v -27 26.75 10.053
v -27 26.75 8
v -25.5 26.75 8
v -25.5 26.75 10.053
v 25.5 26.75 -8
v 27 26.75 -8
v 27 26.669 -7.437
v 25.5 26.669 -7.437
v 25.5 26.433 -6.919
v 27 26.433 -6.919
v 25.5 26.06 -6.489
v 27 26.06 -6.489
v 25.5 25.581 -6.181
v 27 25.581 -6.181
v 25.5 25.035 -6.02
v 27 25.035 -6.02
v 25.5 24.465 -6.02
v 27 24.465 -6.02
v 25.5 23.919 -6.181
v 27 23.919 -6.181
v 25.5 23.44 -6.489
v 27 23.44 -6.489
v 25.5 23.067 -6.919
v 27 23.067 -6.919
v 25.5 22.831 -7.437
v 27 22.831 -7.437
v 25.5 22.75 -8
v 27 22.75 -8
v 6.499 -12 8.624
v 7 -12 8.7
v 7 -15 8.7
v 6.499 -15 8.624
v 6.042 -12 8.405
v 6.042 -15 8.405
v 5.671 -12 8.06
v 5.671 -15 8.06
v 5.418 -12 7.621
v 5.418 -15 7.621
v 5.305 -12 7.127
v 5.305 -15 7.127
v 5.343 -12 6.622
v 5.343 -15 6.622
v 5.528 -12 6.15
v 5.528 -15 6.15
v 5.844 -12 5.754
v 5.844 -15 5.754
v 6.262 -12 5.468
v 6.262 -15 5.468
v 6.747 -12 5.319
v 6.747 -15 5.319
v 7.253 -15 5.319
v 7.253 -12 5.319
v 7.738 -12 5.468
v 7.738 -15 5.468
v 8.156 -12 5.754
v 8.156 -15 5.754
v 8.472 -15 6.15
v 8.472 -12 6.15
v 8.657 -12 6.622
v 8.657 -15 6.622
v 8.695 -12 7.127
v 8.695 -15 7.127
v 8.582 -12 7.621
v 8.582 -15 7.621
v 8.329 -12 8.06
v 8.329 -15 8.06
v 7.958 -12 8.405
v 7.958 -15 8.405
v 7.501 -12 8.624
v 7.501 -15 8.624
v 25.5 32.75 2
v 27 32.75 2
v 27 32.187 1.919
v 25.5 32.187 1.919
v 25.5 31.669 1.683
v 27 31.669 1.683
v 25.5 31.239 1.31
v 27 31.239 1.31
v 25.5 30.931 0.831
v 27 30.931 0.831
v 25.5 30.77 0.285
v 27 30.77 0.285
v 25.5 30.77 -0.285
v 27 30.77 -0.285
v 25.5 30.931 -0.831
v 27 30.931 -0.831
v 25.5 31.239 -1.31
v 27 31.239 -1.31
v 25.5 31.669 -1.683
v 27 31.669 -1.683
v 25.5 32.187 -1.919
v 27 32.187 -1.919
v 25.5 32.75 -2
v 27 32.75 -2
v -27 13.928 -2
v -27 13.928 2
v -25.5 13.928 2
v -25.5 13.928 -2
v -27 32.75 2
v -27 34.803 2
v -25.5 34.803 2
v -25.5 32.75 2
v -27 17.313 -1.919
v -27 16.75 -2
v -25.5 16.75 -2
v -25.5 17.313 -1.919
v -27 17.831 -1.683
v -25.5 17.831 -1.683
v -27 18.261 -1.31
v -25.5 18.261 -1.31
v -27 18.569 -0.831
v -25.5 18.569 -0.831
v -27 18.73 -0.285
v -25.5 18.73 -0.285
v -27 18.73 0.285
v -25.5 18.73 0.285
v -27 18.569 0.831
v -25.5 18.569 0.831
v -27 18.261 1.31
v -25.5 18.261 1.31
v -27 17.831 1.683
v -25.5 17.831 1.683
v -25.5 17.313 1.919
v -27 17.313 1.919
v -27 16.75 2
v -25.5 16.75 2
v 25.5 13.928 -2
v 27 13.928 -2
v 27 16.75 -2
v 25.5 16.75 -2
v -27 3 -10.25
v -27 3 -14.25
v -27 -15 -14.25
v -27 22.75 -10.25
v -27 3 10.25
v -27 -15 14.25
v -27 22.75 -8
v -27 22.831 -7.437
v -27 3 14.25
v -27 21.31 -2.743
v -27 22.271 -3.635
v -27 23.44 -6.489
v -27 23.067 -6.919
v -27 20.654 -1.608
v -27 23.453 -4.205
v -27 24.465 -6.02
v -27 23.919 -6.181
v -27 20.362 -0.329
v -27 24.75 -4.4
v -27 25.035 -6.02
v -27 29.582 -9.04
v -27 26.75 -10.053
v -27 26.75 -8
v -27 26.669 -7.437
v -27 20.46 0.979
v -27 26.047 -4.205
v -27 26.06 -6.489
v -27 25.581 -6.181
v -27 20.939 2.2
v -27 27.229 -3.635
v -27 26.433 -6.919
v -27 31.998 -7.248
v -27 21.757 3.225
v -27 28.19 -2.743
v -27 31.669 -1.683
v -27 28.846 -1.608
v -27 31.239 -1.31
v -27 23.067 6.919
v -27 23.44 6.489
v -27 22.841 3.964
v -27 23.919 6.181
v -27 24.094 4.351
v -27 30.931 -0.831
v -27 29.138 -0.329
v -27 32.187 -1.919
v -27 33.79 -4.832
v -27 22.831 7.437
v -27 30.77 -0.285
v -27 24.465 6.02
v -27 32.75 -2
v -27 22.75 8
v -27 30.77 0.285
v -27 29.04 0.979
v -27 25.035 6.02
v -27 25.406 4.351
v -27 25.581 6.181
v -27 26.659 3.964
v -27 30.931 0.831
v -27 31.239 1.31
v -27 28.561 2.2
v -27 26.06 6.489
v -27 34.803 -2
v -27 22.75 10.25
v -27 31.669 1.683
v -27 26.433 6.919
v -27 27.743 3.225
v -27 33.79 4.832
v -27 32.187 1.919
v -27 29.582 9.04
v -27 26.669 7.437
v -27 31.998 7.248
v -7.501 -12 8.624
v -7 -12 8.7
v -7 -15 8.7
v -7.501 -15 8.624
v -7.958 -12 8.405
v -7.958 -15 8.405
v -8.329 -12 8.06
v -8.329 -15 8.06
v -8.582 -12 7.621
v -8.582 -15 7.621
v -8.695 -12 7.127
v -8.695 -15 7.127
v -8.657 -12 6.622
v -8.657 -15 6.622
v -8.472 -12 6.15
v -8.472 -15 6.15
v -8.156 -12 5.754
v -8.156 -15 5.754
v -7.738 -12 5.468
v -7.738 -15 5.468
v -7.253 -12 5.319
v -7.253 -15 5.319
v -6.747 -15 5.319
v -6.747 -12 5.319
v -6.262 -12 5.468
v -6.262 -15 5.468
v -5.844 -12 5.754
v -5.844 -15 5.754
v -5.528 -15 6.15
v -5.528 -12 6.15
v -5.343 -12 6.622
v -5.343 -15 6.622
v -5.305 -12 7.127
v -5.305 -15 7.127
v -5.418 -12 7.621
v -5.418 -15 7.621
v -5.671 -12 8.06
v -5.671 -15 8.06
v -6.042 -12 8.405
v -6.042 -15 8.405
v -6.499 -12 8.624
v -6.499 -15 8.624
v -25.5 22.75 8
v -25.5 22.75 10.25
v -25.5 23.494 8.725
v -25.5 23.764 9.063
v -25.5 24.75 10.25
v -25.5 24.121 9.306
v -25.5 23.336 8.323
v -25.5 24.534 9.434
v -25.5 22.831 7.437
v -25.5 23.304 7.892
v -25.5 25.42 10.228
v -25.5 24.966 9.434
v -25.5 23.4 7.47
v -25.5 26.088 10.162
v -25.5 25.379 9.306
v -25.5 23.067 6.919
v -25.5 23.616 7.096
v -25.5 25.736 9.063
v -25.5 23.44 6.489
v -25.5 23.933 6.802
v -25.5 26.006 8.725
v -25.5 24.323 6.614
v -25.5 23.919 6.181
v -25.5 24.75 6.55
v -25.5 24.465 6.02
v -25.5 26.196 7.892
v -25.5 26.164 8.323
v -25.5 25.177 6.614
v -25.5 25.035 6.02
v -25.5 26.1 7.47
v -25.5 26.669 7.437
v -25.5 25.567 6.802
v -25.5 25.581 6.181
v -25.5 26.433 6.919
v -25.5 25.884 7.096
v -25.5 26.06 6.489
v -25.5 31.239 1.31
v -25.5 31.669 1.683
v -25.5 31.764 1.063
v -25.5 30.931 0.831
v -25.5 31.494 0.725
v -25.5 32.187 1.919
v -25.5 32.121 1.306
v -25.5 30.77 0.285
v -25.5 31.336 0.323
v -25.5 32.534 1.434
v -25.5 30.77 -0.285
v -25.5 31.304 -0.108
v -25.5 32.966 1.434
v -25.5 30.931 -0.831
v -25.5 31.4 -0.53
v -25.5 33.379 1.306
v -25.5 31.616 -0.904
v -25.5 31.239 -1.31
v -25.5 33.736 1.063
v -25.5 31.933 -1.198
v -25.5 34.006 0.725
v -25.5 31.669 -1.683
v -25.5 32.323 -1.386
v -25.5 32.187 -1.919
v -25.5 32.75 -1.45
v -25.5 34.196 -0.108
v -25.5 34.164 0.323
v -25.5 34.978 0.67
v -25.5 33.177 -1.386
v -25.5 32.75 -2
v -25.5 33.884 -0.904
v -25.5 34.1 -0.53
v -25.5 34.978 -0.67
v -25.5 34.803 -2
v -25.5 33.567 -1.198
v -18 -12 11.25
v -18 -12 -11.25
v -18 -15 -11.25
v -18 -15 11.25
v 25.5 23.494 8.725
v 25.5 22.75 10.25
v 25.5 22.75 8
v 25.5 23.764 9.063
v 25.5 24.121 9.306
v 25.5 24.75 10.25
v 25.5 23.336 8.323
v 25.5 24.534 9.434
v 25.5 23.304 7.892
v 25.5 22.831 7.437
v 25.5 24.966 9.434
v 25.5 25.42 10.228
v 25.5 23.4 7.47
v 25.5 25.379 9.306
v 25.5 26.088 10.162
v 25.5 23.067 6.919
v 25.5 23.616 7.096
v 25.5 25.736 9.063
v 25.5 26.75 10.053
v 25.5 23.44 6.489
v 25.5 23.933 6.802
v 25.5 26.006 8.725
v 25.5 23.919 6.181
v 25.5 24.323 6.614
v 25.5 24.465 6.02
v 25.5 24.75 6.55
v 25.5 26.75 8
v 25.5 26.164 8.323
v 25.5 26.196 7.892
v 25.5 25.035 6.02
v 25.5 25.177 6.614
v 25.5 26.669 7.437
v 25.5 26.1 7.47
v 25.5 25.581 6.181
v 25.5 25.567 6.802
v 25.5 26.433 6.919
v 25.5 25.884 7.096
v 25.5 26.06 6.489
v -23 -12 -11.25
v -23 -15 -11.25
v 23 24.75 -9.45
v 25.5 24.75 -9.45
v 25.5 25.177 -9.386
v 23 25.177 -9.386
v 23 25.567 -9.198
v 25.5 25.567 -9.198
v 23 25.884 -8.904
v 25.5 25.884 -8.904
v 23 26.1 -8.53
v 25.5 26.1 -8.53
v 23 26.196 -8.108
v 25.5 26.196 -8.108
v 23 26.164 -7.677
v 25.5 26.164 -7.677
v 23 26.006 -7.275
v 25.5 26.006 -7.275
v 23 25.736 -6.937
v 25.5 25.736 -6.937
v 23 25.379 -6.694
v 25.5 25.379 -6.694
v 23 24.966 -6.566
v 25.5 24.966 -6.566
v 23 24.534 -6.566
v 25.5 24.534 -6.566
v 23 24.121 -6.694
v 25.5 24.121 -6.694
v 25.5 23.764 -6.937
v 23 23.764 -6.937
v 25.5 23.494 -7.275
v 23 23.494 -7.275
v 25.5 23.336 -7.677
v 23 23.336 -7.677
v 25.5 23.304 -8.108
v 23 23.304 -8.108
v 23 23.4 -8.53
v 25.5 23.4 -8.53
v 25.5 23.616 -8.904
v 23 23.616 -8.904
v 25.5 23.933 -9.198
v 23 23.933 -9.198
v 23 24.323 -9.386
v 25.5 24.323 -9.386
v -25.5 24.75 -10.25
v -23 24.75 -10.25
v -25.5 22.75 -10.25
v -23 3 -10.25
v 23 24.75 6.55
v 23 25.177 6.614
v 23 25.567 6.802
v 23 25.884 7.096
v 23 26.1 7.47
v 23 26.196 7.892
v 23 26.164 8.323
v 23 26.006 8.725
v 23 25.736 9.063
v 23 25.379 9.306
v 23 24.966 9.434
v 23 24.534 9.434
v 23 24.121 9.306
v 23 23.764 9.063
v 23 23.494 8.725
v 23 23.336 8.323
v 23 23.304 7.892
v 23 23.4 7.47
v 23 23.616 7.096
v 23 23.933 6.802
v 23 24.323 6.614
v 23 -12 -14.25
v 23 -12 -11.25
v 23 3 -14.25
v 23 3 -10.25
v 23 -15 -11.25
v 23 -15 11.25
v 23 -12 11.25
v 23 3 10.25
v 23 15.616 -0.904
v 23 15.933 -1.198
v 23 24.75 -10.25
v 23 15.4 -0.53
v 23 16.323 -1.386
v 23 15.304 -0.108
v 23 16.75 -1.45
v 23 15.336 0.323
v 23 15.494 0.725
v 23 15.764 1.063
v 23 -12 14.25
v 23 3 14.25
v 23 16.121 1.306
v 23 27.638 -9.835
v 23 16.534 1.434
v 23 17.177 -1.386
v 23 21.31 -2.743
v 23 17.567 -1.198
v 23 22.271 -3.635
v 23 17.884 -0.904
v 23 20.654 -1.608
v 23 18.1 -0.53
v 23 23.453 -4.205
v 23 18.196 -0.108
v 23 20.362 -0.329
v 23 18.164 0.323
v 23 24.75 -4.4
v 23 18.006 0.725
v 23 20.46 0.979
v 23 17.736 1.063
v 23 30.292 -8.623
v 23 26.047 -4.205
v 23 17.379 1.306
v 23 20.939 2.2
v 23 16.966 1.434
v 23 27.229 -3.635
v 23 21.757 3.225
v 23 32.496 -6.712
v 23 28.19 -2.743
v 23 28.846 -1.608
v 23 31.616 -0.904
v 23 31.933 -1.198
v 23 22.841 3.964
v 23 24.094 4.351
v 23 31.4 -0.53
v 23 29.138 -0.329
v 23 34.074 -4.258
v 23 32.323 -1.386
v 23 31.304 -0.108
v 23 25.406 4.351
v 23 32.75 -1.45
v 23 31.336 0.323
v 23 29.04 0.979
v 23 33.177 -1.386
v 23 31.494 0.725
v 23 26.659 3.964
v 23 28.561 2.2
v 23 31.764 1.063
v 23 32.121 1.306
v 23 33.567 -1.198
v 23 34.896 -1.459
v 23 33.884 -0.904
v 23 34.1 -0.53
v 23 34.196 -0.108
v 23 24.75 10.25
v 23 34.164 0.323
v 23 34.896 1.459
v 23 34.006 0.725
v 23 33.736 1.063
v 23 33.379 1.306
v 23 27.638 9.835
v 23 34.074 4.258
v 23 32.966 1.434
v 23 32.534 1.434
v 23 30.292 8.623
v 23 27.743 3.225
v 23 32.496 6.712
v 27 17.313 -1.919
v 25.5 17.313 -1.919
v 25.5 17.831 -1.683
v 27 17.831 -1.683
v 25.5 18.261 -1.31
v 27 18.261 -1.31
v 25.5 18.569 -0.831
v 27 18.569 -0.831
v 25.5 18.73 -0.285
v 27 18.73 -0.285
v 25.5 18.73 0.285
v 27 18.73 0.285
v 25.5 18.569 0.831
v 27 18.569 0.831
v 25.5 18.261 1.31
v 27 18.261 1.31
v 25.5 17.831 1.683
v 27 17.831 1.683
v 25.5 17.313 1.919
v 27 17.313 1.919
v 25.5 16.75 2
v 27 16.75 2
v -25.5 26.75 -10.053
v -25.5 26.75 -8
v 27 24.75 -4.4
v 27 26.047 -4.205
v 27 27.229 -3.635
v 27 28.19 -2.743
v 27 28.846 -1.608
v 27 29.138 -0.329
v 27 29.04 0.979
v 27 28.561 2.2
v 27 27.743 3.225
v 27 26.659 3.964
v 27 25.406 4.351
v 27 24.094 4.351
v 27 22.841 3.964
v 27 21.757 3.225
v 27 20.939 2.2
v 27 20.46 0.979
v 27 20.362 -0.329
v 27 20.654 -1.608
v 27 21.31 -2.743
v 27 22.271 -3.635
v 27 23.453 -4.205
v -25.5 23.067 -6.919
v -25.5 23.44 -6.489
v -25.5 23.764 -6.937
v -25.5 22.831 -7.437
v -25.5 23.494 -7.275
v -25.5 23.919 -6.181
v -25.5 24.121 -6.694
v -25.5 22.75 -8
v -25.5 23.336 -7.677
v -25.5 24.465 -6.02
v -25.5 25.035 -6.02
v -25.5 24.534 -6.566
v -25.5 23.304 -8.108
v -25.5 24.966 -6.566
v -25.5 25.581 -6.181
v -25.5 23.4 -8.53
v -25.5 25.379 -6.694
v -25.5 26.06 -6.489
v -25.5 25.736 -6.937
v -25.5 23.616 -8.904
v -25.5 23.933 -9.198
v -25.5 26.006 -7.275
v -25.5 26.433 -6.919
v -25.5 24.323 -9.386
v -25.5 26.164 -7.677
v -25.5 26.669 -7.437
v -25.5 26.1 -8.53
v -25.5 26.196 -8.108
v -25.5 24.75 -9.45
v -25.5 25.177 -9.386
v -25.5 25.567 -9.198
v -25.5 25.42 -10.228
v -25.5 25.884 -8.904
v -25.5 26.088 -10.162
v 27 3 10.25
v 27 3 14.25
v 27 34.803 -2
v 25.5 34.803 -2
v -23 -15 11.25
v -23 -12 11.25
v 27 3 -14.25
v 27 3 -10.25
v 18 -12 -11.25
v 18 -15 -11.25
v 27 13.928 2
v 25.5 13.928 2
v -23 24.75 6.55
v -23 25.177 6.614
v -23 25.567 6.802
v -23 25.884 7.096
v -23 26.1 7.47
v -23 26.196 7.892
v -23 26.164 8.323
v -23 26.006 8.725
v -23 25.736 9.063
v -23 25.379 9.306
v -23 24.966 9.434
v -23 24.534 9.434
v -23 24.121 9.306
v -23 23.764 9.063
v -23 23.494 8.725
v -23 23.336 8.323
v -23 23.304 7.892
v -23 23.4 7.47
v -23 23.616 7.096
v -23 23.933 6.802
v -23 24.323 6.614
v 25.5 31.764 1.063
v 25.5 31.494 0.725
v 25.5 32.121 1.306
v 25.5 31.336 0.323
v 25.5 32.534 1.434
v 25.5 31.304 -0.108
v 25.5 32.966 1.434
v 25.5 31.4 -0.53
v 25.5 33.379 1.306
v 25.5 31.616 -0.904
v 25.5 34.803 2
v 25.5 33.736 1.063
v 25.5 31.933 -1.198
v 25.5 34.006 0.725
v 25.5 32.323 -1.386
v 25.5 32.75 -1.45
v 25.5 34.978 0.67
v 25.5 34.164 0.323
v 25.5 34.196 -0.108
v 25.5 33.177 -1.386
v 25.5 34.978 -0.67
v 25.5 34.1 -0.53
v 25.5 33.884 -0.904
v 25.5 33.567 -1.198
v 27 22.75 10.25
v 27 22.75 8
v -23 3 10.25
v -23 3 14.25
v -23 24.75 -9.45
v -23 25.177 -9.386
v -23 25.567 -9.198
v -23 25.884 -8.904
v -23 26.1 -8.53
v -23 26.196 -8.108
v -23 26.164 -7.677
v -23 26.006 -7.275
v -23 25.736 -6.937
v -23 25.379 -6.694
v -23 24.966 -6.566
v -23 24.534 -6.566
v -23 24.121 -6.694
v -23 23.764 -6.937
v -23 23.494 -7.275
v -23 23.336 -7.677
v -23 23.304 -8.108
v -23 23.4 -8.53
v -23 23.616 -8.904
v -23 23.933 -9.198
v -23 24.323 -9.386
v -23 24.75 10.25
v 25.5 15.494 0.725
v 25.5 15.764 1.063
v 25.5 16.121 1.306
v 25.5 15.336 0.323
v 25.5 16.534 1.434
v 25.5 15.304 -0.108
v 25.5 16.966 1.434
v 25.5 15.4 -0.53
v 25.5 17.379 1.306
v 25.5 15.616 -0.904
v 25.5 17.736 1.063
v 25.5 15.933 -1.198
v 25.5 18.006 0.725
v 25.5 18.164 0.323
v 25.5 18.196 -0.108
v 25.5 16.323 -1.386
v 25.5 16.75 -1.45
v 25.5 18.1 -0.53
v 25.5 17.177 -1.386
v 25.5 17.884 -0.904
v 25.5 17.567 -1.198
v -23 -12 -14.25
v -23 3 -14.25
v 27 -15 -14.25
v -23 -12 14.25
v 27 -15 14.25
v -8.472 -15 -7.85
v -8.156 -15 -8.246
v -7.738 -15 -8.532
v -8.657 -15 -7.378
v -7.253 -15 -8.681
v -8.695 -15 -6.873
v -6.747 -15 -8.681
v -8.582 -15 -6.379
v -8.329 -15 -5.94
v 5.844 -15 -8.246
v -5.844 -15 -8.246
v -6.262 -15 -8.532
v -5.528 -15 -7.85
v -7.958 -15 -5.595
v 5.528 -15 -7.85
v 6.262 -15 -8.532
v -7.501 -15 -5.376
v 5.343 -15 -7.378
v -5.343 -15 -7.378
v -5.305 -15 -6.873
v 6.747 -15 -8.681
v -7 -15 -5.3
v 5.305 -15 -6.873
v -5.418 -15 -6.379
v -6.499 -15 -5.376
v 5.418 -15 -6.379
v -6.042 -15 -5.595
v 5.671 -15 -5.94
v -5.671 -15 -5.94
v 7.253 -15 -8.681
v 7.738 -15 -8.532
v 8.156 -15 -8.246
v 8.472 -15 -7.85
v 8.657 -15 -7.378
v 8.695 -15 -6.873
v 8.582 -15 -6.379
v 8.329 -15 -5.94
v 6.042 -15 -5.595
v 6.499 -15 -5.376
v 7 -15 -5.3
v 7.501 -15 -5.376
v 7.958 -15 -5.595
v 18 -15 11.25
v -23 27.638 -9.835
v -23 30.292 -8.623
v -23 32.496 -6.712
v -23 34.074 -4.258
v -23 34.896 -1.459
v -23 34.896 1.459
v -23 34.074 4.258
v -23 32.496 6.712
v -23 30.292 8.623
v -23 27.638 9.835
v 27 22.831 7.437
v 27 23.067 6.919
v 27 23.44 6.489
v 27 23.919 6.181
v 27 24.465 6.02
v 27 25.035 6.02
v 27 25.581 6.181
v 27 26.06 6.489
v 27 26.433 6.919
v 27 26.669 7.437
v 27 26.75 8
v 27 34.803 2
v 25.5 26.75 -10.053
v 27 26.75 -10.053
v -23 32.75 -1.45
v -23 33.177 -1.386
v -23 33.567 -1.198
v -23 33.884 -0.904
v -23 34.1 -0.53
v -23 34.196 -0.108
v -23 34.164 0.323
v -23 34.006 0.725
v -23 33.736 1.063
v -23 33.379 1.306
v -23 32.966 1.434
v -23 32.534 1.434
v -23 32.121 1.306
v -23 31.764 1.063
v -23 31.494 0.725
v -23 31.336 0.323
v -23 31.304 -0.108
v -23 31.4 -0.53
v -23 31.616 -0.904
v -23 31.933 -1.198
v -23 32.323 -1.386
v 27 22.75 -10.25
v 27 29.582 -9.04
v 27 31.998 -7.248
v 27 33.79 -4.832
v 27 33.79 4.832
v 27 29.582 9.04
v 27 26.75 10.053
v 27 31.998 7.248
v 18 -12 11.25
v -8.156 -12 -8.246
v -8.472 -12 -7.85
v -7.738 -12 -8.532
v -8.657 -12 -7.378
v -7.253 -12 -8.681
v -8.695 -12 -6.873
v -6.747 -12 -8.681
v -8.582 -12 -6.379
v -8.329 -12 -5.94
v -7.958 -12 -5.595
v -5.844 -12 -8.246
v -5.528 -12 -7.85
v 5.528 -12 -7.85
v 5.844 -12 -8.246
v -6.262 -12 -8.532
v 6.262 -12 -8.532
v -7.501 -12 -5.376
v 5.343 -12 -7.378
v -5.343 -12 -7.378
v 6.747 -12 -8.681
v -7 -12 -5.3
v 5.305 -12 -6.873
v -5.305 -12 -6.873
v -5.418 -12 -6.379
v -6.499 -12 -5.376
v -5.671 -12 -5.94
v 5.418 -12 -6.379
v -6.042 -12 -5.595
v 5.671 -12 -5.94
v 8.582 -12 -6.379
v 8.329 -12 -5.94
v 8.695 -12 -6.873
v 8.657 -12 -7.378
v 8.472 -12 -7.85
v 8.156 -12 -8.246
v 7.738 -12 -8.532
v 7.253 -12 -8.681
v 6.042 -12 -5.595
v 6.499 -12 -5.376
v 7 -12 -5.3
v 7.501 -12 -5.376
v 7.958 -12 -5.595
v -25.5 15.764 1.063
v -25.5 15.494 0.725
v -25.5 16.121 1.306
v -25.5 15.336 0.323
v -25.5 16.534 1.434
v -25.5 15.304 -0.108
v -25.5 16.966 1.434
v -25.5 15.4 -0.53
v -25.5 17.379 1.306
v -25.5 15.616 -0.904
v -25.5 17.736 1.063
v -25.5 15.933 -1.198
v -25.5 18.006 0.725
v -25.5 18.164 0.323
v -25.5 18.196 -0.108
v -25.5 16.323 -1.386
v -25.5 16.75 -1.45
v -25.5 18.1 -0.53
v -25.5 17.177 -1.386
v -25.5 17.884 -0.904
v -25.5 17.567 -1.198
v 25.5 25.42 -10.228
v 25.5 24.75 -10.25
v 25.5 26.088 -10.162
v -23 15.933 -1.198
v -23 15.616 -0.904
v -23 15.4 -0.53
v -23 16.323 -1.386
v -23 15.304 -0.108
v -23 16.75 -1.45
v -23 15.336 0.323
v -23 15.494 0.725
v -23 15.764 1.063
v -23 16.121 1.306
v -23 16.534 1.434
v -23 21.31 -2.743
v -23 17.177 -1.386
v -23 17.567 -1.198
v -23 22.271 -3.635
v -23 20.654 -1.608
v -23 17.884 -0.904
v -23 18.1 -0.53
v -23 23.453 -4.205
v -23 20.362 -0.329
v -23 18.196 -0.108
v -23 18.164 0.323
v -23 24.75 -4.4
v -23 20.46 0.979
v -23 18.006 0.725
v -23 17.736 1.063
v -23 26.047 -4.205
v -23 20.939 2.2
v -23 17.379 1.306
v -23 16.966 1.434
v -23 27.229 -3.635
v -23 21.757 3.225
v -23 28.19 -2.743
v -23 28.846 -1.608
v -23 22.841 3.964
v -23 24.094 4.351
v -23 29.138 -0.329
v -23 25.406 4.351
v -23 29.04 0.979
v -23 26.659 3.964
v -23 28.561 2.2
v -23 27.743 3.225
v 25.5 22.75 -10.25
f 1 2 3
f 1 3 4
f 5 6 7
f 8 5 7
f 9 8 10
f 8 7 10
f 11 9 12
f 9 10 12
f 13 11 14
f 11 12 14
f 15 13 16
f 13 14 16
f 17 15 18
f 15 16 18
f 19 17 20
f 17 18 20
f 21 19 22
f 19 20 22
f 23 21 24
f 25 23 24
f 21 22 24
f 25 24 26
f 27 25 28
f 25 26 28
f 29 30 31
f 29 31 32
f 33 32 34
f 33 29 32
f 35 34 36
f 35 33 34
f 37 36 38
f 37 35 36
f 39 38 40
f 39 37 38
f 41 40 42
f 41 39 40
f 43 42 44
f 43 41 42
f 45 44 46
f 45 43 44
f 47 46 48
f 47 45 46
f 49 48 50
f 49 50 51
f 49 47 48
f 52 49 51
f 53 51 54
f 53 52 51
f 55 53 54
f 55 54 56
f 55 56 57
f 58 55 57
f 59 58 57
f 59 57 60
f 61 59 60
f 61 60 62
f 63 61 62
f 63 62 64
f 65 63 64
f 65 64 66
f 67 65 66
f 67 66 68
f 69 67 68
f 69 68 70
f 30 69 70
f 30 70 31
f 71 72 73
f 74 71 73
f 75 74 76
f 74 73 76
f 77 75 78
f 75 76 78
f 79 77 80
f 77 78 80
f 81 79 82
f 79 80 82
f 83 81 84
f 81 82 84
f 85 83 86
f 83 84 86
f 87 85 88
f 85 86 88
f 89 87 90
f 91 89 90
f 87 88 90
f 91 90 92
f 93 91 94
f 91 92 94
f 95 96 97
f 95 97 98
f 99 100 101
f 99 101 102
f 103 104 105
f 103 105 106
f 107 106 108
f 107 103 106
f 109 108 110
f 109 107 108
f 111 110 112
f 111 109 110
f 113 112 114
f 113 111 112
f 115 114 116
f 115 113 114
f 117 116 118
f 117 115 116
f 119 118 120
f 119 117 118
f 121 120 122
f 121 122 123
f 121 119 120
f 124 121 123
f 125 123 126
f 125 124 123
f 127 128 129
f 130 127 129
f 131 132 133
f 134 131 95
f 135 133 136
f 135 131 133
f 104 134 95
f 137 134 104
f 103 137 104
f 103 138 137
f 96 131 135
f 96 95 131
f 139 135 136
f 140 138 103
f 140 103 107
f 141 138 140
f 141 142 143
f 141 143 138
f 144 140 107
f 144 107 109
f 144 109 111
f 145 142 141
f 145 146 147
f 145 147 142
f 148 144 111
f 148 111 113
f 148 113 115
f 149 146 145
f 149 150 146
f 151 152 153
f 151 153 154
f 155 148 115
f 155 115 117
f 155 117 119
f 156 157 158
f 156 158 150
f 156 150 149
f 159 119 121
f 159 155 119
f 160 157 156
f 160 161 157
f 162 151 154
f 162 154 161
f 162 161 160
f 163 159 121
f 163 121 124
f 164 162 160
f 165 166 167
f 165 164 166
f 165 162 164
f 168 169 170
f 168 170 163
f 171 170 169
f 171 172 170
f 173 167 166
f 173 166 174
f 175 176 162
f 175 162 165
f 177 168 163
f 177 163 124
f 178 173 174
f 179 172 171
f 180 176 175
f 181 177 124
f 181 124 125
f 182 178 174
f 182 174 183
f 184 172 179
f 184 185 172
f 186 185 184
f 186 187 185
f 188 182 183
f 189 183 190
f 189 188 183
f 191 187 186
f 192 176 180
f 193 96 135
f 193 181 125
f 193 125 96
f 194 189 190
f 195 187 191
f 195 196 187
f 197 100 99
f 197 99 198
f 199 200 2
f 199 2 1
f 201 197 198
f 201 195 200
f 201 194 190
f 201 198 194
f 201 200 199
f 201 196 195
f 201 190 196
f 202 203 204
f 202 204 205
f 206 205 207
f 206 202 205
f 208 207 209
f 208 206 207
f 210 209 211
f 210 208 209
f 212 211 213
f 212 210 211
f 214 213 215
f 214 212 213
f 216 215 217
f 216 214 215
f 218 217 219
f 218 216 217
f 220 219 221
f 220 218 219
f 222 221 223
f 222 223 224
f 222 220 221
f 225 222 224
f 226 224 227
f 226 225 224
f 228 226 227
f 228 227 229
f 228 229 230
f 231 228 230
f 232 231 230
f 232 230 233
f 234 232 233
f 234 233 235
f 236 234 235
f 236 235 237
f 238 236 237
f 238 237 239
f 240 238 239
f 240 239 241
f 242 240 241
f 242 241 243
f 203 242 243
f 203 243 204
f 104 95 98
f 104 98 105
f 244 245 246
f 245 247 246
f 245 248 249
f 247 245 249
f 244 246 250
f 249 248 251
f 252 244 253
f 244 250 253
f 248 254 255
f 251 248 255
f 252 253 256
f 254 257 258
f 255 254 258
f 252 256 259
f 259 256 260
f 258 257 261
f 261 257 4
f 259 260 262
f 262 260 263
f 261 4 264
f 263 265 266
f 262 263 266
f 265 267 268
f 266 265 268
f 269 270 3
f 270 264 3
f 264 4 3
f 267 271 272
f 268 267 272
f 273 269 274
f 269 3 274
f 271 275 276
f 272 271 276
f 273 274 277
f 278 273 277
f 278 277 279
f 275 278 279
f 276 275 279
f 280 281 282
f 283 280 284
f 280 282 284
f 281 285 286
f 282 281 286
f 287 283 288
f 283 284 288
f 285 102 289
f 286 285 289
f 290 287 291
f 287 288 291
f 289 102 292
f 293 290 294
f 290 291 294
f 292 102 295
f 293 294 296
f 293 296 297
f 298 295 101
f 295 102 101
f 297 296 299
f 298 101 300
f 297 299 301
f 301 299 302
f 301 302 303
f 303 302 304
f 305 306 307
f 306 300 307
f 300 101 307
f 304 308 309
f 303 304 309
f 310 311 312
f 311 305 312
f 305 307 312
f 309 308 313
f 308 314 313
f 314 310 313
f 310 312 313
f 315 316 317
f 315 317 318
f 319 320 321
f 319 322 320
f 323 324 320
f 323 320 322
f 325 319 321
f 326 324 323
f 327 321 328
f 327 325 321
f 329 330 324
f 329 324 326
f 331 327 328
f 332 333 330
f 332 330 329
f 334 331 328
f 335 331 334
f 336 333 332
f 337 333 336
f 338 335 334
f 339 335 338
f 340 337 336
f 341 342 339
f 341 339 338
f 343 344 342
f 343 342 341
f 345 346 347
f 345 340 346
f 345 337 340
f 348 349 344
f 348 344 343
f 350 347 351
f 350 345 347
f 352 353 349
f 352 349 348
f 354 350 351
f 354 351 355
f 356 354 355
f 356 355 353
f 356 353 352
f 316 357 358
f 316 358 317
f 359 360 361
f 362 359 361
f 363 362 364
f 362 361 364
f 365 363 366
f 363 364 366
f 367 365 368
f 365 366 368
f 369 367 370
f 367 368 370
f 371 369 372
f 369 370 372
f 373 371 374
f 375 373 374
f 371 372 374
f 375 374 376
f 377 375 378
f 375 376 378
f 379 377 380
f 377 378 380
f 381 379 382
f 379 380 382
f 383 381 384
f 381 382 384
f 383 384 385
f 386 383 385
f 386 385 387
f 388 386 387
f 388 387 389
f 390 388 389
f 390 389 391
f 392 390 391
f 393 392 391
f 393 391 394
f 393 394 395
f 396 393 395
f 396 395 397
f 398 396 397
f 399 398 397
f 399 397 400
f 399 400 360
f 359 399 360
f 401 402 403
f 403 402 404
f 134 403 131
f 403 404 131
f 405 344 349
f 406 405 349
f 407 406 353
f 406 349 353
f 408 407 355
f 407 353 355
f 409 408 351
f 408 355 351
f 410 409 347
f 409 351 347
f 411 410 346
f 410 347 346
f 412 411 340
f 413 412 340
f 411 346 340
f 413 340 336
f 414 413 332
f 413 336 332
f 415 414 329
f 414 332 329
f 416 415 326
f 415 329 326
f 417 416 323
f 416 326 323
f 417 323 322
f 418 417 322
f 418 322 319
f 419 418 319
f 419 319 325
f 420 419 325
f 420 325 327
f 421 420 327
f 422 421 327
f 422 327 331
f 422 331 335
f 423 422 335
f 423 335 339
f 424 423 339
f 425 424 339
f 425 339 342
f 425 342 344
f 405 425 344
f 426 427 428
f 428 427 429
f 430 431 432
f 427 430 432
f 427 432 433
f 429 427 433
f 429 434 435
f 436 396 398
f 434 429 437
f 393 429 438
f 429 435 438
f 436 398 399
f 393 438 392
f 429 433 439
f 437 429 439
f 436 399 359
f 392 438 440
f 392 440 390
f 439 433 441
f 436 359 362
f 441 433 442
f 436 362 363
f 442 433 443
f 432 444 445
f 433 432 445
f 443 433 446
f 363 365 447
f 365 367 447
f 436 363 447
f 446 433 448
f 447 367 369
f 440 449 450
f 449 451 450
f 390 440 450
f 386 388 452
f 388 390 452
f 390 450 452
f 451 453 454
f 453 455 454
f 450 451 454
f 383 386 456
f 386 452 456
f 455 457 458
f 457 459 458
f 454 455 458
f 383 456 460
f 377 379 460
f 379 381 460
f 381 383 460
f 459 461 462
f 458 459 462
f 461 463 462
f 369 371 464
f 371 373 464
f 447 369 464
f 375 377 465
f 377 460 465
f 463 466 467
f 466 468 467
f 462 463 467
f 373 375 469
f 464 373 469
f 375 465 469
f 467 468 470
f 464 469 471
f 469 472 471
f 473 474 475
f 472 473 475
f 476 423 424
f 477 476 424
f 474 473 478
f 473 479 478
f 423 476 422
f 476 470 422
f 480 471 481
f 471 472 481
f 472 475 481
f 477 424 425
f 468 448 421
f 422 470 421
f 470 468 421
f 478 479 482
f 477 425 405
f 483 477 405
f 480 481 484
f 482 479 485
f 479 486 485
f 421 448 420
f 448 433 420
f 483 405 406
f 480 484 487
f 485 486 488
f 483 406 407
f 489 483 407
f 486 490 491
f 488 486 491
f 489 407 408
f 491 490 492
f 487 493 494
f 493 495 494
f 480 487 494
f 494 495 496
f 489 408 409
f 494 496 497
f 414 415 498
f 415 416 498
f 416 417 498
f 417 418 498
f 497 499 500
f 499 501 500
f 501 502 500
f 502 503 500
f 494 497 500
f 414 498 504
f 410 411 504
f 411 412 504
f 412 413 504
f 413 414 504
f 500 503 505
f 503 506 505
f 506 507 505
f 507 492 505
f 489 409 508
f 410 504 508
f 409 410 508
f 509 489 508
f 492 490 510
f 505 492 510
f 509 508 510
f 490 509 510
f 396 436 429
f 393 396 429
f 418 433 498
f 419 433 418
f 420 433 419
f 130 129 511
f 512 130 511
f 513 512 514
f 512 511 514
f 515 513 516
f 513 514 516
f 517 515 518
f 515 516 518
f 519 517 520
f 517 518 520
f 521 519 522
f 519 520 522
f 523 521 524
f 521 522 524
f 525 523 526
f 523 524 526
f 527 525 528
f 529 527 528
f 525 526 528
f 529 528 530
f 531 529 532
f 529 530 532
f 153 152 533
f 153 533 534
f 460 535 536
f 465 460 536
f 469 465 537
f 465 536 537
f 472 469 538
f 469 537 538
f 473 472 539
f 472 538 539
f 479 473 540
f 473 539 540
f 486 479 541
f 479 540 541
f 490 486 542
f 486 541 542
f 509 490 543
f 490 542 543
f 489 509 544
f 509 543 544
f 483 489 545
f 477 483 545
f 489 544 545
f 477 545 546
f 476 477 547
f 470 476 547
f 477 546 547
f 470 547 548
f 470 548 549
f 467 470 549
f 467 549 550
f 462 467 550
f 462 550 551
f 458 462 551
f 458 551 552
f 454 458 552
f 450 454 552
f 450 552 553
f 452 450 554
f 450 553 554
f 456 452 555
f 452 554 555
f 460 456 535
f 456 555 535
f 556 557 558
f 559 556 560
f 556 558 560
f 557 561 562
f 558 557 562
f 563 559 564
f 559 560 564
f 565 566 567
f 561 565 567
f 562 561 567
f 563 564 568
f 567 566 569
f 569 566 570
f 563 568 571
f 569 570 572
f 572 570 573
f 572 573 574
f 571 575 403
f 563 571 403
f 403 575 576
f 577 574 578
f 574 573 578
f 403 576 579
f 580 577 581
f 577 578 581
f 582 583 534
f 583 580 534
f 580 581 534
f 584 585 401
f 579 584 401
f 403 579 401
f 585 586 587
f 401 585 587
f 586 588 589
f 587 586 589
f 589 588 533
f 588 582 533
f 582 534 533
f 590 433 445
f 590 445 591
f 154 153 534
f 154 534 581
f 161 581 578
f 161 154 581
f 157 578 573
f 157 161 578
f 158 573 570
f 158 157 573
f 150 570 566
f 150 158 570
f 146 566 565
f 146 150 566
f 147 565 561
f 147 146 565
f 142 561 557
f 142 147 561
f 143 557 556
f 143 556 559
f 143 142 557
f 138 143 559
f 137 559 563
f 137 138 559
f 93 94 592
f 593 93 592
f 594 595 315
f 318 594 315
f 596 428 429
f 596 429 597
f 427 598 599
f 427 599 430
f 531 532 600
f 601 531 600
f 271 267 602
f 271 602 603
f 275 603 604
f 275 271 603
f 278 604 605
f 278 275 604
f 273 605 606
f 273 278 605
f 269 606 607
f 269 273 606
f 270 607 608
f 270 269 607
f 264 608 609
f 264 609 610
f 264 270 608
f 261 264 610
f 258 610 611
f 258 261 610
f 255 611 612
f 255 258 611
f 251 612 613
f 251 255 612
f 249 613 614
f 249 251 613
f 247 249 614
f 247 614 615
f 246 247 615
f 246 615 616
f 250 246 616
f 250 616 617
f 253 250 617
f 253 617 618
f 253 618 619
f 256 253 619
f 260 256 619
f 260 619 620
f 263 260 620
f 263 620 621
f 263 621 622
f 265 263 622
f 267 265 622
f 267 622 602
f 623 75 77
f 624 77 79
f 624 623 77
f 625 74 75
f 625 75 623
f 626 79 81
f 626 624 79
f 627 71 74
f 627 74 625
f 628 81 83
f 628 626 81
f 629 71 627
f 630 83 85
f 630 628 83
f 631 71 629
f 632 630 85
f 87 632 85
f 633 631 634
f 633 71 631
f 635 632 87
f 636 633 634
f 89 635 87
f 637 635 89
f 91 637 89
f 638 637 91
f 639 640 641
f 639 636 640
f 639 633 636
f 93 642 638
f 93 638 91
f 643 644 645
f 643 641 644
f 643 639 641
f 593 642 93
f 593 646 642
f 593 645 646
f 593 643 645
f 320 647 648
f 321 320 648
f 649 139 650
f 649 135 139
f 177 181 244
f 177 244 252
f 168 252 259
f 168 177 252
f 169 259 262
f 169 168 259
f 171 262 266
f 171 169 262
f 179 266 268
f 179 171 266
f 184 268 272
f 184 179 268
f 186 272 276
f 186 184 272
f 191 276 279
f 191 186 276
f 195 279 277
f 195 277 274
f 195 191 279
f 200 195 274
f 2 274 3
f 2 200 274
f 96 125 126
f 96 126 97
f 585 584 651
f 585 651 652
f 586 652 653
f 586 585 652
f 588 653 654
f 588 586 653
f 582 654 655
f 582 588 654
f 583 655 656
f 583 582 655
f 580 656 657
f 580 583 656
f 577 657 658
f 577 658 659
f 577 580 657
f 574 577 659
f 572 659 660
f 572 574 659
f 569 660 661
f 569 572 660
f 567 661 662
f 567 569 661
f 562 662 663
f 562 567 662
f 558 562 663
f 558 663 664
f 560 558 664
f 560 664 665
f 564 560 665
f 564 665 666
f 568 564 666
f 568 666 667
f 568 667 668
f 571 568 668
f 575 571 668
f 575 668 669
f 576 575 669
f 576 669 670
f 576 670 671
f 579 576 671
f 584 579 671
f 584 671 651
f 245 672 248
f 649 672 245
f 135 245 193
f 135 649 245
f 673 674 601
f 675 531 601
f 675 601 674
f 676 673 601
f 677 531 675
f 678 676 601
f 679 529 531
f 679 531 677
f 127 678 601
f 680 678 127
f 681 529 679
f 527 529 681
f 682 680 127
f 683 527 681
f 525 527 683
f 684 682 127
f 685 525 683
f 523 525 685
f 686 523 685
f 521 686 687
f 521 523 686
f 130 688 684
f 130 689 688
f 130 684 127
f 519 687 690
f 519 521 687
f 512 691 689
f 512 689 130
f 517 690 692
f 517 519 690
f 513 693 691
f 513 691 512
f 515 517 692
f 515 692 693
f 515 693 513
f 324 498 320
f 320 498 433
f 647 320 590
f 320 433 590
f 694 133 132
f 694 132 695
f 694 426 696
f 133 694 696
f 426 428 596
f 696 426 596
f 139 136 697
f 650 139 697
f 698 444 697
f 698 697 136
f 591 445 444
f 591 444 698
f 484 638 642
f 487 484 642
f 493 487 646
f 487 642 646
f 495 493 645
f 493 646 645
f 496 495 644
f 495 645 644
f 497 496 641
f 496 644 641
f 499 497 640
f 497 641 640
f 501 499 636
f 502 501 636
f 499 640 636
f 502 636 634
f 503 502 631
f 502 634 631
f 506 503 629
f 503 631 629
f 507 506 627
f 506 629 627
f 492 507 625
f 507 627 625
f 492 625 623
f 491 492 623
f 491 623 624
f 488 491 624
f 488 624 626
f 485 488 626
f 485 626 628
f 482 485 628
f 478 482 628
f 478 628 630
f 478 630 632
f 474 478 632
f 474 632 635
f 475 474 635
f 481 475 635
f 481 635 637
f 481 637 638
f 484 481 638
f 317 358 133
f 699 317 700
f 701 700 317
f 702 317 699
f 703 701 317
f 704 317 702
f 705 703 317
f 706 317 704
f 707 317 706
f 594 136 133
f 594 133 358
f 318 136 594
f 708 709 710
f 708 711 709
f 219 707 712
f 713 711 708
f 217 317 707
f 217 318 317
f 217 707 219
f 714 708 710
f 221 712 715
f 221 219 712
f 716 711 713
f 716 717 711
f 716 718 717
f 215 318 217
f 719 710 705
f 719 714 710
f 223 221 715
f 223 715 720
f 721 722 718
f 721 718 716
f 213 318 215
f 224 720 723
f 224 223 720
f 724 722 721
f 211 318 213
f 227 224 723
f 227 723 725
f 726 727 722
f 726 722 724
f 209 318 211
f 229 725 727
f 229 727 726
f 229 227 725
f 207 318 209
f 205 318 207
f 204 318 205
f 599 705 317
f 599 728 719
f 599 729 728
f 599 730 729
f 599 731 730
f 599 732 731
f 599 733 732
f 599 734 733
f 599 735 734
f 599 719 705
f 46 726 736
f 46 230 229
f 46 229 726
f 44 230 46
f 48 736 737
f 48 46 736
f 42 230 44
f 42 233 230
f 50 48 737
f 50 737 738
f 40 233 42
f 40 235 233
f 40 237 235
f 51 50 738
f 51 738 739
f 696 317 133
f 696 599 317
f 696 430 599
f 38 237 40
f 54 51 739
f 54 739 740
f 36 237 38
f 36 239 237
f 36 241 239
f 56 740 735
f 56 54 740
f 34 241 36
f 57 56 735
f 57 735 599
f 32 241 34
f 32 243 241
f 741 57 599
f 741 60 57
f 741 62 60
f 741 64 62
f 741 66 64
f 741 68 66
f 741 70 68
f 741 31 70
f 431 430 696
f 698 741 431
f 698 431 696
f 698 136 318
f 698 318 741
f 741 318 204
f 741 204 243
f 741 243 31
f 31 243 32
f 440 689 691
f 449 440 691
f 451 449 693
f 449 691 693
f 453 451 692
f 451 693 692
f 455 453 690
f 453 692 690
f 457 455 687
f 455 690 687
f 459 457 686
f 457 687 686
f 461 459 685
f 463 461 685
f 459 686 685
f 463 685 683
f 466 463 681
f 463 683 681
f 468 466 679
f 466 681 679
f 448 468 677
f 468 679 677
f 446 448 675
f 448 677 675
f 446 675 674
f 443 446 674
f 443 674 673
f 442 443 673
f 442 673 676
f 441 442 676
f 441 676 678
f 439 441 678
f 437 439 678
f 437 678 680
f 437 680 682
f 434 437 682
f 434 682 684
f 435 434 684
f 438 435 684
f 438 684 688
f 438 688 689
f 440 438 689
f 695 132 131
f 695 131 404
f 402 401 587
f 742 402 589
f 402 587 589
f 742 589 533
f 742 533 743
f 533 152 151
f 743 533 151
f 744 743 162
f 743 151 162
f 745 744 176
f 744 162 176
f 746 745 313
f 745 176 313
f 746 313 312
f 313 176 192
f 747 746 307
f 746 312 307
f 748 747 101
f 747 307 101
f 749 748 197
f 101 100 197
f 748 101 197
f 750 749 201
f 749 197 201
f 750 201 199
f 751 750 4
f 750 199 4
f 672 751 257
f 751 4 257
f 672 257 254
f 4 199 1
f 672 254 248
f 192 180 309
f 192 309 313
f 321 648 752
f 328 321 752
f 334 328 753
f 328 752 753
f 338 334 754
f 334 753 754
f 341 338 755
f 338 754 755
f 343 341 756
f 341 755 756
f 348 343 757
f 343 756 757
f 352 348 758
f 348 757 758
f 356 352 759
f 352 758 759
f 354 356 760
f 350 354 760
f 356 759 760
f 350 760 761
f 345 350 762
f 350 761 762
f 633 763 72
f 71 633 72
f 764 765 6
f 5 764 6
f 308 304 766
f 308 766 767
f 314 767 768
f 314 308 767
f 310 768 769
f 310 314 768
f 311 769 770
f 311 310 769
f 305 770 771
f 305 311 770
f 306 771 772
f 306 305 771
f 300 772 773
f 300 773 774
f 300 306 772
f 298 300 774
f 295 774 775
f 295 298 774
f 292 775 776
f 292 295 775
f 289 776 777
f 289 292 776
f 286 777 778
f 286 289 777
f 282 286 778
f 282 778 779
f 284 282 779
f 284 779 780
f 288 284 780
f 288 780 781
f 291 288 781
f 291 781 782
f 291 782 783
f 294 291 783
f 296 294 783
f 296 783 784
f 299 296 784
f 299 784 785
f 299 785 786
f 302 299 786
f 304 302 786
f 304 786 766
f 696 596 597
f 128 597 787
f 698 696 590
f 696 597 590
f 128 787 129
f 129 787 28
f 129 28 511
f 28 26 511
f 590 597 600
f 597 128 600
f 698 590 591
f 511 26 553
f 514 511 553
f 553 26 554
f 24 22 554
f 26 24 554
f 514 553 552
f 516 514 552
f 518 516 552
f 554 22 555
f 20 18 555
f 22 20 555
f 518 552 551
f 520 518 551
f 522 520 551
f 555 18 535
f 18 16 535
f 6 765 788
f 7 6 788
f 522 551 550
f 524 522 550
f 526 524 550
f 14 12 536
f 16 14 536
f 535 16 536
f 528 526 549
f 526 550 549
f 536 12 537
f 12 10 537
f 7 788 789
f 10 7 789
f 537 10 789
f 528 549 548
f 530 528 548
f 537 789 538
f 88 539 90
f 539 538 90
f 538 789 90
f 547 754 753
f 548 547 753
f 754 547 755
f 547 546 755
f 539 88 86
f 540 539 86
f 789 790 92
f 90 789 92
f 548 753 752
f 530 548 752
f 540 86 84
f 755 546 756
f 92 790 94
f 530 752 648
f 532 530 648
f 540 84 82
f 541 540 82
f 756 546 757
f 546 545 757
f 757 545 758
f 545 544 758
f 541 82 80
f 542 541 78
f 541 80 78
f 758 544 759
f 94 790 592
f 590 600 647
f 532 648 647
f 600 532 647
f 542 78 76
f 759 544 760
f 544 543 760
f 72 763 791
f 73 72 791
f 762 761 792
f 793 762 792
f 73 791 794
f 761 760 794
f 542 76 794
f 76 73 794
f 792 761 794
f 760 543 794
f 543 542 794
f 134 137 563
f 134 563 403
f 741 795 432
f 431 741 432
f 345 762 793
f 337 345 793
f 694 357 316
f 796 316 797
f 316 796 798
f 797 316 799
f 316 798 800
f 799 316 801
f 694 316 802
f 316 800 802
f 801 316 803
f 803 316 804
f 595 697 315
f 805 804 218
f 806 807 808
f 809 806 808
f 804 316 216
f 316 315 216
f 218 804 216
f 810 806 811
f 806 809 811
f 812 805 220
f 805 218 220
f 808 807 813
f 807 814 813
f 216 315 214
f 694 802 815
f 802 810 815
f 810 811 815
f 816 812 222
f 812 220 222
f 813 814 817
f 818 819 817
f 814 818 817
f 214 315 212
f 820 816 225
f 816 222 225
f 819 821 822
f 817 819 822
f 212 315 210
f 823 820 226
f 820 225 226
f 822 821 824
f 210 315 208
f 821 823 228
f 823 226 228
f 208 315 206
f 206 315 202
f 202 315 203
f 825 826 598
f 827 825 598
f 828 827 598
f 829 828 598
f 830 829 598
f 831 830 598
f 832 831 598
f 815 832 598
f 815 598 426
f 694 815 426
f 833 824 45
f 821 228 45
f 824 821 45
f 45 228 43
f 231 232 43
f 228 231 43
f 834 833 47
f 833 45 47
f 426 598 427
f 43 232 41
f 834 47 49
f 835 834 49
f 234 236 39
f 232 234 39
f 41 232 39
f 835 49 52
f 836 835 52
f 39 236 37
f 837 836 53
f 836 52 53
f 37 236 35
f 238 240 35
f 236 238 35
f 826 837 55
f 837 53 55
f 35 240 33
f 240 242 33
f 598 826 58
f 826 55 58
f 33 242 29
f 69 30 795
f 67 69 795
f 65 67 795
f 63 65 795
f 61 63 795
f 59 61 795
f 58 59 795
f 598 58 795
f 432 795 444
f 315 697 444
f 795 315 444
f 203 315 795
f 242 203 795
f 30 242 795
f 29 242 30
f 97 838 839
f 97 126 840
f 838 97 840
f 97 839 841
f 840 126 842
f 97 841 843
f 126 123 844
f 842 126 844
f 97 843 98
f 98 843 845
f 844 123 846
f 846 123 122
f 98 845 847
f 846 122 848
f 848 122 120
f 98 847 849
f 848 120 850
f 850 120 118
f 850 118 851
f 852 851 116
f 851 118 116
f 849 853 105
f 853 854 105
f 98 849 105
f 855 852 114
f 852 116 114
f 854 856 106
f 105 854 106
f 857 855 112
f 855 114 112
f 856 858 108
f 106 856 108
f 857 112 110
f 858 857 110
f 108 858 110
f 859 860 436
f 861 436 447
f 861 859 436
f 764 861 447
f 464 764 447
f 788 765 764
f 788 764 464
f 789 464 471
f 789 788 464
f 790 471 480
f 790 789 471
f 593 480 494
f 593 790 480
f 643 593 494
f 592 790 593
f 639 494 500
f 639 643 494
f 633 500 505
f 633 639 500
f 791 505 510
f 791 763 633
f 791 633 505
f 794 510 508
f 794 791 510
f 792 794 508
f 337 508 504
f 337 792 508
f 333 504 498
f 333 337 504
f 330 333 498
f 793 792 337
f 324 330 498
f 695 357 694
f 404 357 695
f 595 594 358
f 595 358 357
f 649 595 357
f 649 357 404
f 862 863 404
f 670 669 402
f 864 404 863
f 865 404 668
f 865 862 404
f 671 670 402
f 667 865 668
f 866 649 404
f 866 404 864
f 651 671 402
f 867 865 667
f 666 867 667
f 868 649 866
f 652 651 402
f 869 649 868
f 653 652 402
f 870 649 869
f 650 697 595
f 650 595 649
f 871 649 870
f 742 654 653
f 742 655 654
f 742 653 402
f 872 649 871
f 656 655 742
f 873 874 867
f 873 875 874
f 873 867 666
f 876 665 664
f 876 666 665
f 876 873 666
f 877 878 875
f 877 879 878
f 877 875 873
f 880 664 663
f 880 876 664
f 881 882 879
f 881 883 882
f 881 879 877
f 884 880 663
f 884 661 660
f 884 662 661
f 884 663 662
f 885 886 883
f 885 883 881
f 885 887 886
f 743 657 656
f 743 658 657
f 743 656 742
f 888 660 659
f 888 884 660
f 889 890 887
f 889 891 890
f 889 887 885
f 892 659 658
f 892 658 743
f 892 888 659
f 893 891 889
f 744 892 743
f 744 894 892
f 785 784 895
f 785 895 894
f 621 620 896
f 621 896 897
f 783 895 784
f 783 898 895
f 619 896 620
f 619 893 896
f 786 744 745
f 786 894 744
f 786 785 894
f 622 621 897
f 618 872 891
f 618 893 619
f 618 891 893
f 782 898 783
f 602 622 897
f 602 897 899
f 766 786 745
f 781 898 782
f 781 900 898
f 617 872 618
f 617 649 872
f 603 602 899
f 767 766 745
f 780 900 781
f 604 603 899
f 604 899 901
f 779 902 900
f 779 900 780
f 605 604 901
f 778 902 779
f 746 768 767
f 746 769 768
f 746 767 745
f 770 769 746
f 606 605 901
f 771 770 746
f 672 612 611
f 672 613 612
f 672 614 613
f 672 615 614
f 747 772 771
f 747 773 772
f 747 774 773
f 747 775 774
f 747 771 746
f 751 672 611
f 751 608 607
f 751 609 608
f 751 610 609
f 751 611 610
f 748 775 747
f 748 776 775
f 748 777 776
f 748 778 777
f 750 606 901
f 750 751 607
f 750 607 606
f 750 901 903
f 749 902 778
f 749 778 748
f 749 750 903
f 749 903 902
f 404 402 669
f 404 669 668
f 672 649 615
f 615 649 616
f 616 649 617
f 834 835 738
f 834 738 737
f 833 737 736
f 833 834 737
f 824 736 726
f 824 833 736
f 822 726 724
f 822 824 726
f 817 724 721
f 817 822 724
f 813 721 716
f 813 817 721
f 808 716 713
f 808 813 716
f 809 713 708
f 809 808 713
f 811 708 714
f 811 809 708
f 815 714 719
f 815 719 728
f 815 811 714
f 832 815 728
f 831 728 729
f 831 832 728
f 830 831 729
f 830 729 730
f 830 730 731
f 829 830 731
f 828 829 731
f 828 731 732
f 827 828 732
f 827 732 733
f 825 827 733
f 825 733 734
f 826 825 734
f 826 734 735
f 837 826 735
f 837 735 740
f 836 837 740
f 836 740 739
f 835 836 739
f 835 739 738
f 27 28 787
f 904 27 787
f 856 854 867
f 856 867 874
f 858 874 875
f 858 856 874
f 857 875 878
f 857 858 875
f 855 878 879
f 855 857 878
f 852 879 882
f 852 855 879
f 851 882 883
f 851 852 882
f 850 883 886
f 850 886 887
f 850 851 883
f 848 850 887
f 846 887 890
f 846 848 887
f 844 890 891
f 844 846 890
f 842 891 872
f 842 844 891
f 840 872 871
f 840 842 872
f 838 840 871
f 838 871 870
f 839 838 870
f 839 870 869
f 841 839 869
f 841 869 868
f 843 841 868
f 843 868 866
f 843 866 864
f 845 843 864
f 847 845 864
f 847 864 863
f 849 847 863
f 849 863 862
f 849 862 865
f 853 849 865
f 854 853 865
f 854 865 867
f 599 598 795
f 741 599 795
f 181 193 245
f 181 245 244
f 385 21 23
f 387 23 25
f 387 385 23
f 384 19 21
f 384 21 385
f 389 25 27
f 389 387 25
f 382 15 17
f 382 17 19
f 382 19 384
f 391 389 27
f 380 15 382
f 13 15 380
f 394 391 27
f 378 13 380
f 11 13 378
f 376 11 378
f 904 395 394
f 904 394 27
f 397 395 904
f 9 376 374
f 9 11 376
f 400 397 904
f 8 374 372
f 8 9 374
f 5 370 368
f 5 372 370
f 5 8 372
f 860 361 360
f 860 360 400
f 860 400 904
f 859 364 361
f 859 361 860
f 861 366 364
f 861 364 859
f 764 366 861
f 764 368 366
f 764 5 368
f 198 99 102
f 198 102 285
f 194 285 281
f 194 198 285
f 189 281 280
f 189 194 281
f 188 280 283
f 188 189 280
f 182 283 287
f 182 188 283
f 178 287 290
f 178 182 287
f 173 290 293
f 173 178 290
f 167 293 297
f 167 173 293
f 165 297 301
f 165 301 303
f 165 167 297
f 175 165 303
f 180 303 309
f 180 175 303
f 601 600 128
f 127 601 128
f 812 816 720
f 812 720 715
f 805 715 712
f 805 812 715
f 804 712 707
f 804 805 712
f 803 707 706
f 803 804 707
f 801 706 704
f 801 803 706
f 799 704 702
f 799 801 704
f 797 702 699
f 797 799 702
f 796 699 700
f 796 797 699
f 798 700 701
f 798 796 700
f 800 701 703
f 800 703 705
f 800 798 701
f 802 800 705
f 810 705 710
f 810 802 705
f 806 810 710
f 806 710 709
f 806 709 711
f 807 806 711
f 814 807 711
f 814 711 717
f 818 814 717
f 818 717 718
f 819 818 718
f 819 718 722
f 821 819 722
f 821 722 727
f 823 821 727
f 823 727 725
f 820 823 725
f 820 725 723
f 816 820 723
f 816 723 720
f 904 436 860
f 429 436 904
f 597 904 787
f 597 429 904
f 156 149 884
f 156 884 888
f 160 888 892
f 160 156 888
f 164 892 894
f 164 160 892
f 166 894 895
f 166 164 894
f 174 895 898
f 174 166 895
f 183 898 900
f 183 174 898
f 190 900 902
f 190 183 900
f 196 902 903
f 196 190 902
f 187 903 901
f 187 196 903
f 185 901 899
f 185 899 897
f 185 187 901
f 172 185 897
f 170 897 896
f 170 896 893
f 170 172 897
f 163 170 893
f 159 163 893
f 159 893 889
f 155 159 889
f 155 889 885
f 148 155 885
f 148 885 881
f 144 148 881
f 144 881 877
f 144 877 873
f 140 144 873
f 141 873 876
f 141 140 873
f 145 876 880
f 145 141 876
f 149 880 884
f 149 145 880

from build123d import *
from build123d.topology import SkipClean

# Parameters (mm, degrees)
SKETCH1_W           = 54
SKETCH1_H           = 28.5
SKETCH1_W_2         = 5
SKETCH1_H_2         = 22.5
SKETCH1_R           = 1.7
SKETCH1_R_2         = 7.5
BOSS_EXTRUDE2_DEPTH = 3
SKETCH2_W           = 4
SKETCH2_H           = 20.5
BOSS_EXTRUDE3_DEPTH = 21.75
SKETCH4_R           = 10.25
BOSS_EXTRUDE4_DEPTH = 4
SKETCH6_R           = 4.4
SKETCH6_R_2         = 1.45
CUT_EXTRUDE3_DEPTH  = 4
SKETCH7_R           = 1.45
CUT_EXTRUDE4_DEPTH  = 1.5
SKETCH8_W           = 28.781481152
SKETCH8_H           = 28.5
BOSS_EXTRUDE5_DEPTH = 3
SKETCH9_R           = 1.7
CUT_EXTRUDE5_DEPTH  = 3
SKETCH10_W          = 54
SKETCH10_H          = 28.5
SKETCH10_R          = 1.7
SKETCH10_W_2        = 5
SKETCH10_H_2        = 22.5
BOSS_EXTRUDE6_DEPTH = 15
SKETCH11_W          = 46
SKETCH11_H          = 15
CUT_EXTRUDE6_DEPTH  = 53.595151868


with BuildPart() as part:
    # Sketch1 → Boss-Extrude2 (new body)
    with BuildSketch(Plane(origin=(0, 0, 0), x_dir=(1, 0, 0), z_dir=(0, 1, 0))):
        Rectangle(SKETCH1_W, SKETCH1_H)
        with Locations((20.5, 0)):
            Rectangle(SKETCH1_W_2, SKETCH1_H_2, mode=Mode.SUBTRACT)
        with Locations((-20.5, 0)):
            Rectangle(SKETCH1_W_2, SKETCH1_H_2, mode=Mode.SUBTRACT)
        with Locations(Location((-9, -8.25, 0), (0, 0, 270))):
            Circle(SKETCH1_R, mode=Mode.SUBTRACT)
        with Locations(Location((9, -8.25, 0), (0, 0, 270))):
            Circle(SKETCH1_R, mode=Mode.SUBTRACT)
        with Locations(Location((-9, 8.25, 0), (0, 0, 270))):
            Circle(SKETCH1_R, mode=Mode.SUBTRACT)
        with Locations(Location((0, 0, 0), (0, 0, 270))):
            Circle(SKETCH1_R_2, mode=Mode.SUBTRACT)
        with Locations(Location((9, 8.25, 0), (0, 0, 270))):
            Circle(SKETCH1_R, mode=Mode.SUBTRACT)
    extrude(amount=BOSS_EXTRUDE2_DEPTH)

    # Sketch2 → Boss-Extrude3 (add)
    with BuildSketch(Plane(origin=(0, 3, 0), x_dir=(1, 0, 0), z_dir=(0, 1, 0))):
        with Locations((25, 0)):
            Rectangle(SKETCH2_W, SKETCH2_H)
    boss_extrude3 = extrude(amount=BOSS_EXTRUDE3_DEPTH)

    # Sketch4 → Boss-Extrude4 (add)
    with BuildSketch(Plane(origin=(27, 0, 0), x_dir=(0, 0, -1), z_dir=(1, 0, 0))):
        with Locations((0, 24.75)):
            Circle(SKETCH4_R)
    boss_extrude4 = extrude(amount=-BOSS_EXTRUDE4_DEPTH)

    # Mirror1: Boss-Extrude3, Boss-Extrude4 across plane
    add(boss_extrude3.mirror(Plane(origin=(0, 0, 0), x_dir=(0, 0, 1), z_dir=(1, 0, 0))))
    add(boss_extrude4.mirror(Plane(origin=(0, 0, 0), x_dir=(0, 0, 1), z_dir=(1, 0, 0))))

    # Sketch6 → Cut-Extrude3 (cut)
    with BuildSketch(Plane(origin=(27, 0, 0), x_dir=(0, 0, -1), z_dir=(1, 0, 0))):
        with Locations((0, 24.75)):
            Circle(SKETCH6_R)
        with Locations((0, 32.75)):
            Circle(SKETCH6_R_2)
        with Locations((8, 24.75)):
            Circle(SKETCH6_R_2)
        with Locations((0, 16.75)):
            Circle(SKETCH6_R_2)
        with Locations((-8, 24.75)):
            Circle(SKETCH6_R_2)
    cut_extrude3 = extrude(amount=-CUT_EXTRUDE3_DEPTH, mode=Mode.SUBTRACT)

    # Mirror3: Cut-Extrude3 across plane
    add(cut_extrude3.mirror(Plane(origin=(0, 0, 0), x_dir=(0, 0, 1), z_dir=(1, 0, 0))), mode=Mode.SUBTRACT)

    # Sketch7 → Cut-Extrude4 (cut)
    # profile 1 of 4: a face of its own
    with BuildSketch(Plane(origin=(27, 0, 0), x_dir=(0, 0, -1), z_dir=(1, 0, 0))):
        with BuildLine():
            ThreePointArc((10.25, 24.75), (10.200627247, 25.754840168), (10.052984631, 26.75))
            Line((10.052984631, 26.75), (8, 26.75))
            ThreePointArc((8, 26.75), (6, 24.75), (8, 22.75))
            Line((8, 22.75), (10.25, 22.75))
            Line((10.25, 22.75), (10.25, 24.75))
        make_face()
        with Locations((8, 24.75)):
            Circle(SKETCH7_R, mode=Mode.SUBTRACT)
    # profile 2 of 4: a face of its own
    with BuildSketch(Plane(origin=(27, 0, 0), x_dir=(0, 0, -1), z_dir=(1, 0, 0))):
        with BuildLine():
            Line((2, 32.75), (2, 34.802984631))
            ThreePointArc((2, 34.802984631), (0, 35), (-2, 34.802984631))
            Line((-2, 34.802984631), (-2, 32.75))
            ThreePointArc((-2, 32.75), (0, 30.75), (2, 32.75))
        make_face()
        with Locations((0, 32.75)):
            Circle(SKETCH7_R, mode=Mode.SUBTRACT)
    # profile 3 of 4: a face of its own
    with BuildSketch(Plane(origin=(27, 0, 0), x_dir=(0, 0, -1), z_dir=(1, 0, 0))):
        with BuildLine():
            Line((-8, 26.75), (-10.052984631, 26.75))
            ThreePointArc((-10.052984631, 26.75), (-10.200627247, 25.754840168), (-10.25, 24.75))
            Line((-10.25, 24.75), (-10.25, 22.75))
            Line((-10.25, 22.75), (-8, 22.75))
            ThreePointArc((-8, 22.75), (-6, 24.75), (-8, 26.75))
        make_face()
        with Locations((-8, 24.75)):
            Circle(SKETCH7_R, mode=Mode.SUBTRACT)
    # profile 4 of 4: a face of its own
    with BuildSketch(Plane(origin=(27, 0, 0), x_dir=(0, 0, -1), z_dir=(1, 0, 0))):
        with BuildLine():
            Line((-2, 16.75), (-2, 13.927640071))
            Line((-2, 13.927640071), (2, 13.927640071))
            Line((2, 13.927640071), (2, 16.75))
            ThreePointArc((2, 16.75), (0, 18.75), (-2, 16.75))
        make_face()
        with Locations((0, 16.75)):
            Circle(SKETCH7_R, mode=Mode.SUBTRACT)
    cut_extrude4 = extrude(amount=-CUT_EXTRUDE4_DEPTH, mode=Mode.SUBTRACT)

    # Mirror4: Cut-Extrude4 across plane
    add(cut_extrude4.mirror(Plane(origin=(0, 0, 0), x_dir=(0, 0, 1), z_dir=(1, 0, 0))), mode=Mode.SUBTRACT)

    # Sketch8 → Boss-Extrude5 (add)
    with BuildSketch(Plane(origin=(0, 3, 0), x_dir=(1, 0, 0), z_dir=(0, 1, 0))):
        Rectangle(SKETCH8_W, SKETCH8_H)
    extrude(amount=-BOSS_EXTRUDE5_DEPTH)

    # Sketch9 → Cut-Extrude5 (cut)
    with BuildSketch(Plane(origin=(0, 3, 0), x_dir=(1, 0, 0), z_dir=(0, 1, 0))):
        with BuildLine():
            ThreePointArc((-5.3, -7), (-5.797918472, -5.797918472), (-7, -5.3))
            Line((-7, -5.3), (-7, -7))
            Line((-7, -7), (-5.3, -7))
        make_face()
        with BuildLine():
            Line((-7, -7), (-7, -5.3))
            ThreePointArc((-7, -5.3), (-8.202081528, -8.202081528), (-5.3, -7))
            Line((-5.3, -7), (-7, -7))
        make_face()
        with BuildLine():
            ThreePointArc((8.7, -7), (8.202081528, -5.797918472), (7, -5.3))
            Line((7, -5.3), (7, -7))
            Line((7, -7), (5.3, -7))
            ThreePointArc((5.3, -7), (7, -8.7), (8.7, -7))
        make_face()
        with BuildLine():
            Line((7, -7), (7, -5.3))
            ThreePointArc((7, -5.3), (5.797918472, -5.797918472), (5.3, -7))
            Line((5.3, -7), (7, -7))
        make_face()
        with BuildLine():
            ThreePointArc((8.7, 7), (7, 8.7), (5.3, 7))
            Line((5.3, 7), (7, 7))
            Line((7, 7), (7, 5.3))
            ThreePointArc((7, 5.3), (8.202081528, 5.797918472), (8.7, 7))
        make_face()
        with BuildLine():
            Line((7, 7), (5.3, 7))
            ThreePointArc((5.3, 7), (5.797918472, 5.797918472), (7, 5.3))
            Line((7, 5.3), (7, 7))
        make_face()
        with Locations(Location((-7, 7, 0), (0, 0, 270))):
            Circle(SKETCH9_R)
    extrude(amount=-CUT_EXTRUDE5_DEPTH, mode=Mode.SUBTRACT)

    # Sketch10 → Boss-Extrude6 (add)
    with SkipClean():  # the faces are left unmerged after this step: merging them gives an invalid solid
        with BuildSketch(Plane.XZ):
            Rectangle(SKETCH10_W, SKETCH10_H)
            with Locations(Location((-7, 7, 0), (0, 0, 90))):
                Circle(SKETCH10_R, mode=Mode.SUBTRACT)
            with Locations(Location((-7, -7, 0), (0, 0, 90))):
                Circle(SKETCH10_R, mode=Mode.SUBTRACT)
            with Locations(Location((7, -7, 0), (0, 0, 90))):
                Circle(SKETCH10_R, mode=Mode.SUBTRACT)
            with Locations(Location((7, 7, 0), (0, 0, 90))):
                Circle(SKETCH10_R, mode=Mode.SUBTRACT)
            with Locations((-20.5, 0)):
                Rectangle(SKETCH10_W_2, SKETCH10_H_2, mode=Mode.SUBTRACT)
            with Locations((20.5, 0)):
                Rectangle(SKETCH10_W_2, SKETCH10_H_2, mode=Mode.SUBTRACT)
        extrude(amount=BOSS_EXTRUDE6_DEPTH)

    # Sketch11 → Cut-Extrude6 (cut, through all)
    with BuildSketch(Plane.XY.offset(14.25)):
        with Locations((0, -4.5)):
            Rectangle(SKETCH11_W, SKETCH11_H)
    extrude(amount=-CUT_EXTRUDE6_DEPTH, mode=Mode.SUBTRACT)


solid = part.part
